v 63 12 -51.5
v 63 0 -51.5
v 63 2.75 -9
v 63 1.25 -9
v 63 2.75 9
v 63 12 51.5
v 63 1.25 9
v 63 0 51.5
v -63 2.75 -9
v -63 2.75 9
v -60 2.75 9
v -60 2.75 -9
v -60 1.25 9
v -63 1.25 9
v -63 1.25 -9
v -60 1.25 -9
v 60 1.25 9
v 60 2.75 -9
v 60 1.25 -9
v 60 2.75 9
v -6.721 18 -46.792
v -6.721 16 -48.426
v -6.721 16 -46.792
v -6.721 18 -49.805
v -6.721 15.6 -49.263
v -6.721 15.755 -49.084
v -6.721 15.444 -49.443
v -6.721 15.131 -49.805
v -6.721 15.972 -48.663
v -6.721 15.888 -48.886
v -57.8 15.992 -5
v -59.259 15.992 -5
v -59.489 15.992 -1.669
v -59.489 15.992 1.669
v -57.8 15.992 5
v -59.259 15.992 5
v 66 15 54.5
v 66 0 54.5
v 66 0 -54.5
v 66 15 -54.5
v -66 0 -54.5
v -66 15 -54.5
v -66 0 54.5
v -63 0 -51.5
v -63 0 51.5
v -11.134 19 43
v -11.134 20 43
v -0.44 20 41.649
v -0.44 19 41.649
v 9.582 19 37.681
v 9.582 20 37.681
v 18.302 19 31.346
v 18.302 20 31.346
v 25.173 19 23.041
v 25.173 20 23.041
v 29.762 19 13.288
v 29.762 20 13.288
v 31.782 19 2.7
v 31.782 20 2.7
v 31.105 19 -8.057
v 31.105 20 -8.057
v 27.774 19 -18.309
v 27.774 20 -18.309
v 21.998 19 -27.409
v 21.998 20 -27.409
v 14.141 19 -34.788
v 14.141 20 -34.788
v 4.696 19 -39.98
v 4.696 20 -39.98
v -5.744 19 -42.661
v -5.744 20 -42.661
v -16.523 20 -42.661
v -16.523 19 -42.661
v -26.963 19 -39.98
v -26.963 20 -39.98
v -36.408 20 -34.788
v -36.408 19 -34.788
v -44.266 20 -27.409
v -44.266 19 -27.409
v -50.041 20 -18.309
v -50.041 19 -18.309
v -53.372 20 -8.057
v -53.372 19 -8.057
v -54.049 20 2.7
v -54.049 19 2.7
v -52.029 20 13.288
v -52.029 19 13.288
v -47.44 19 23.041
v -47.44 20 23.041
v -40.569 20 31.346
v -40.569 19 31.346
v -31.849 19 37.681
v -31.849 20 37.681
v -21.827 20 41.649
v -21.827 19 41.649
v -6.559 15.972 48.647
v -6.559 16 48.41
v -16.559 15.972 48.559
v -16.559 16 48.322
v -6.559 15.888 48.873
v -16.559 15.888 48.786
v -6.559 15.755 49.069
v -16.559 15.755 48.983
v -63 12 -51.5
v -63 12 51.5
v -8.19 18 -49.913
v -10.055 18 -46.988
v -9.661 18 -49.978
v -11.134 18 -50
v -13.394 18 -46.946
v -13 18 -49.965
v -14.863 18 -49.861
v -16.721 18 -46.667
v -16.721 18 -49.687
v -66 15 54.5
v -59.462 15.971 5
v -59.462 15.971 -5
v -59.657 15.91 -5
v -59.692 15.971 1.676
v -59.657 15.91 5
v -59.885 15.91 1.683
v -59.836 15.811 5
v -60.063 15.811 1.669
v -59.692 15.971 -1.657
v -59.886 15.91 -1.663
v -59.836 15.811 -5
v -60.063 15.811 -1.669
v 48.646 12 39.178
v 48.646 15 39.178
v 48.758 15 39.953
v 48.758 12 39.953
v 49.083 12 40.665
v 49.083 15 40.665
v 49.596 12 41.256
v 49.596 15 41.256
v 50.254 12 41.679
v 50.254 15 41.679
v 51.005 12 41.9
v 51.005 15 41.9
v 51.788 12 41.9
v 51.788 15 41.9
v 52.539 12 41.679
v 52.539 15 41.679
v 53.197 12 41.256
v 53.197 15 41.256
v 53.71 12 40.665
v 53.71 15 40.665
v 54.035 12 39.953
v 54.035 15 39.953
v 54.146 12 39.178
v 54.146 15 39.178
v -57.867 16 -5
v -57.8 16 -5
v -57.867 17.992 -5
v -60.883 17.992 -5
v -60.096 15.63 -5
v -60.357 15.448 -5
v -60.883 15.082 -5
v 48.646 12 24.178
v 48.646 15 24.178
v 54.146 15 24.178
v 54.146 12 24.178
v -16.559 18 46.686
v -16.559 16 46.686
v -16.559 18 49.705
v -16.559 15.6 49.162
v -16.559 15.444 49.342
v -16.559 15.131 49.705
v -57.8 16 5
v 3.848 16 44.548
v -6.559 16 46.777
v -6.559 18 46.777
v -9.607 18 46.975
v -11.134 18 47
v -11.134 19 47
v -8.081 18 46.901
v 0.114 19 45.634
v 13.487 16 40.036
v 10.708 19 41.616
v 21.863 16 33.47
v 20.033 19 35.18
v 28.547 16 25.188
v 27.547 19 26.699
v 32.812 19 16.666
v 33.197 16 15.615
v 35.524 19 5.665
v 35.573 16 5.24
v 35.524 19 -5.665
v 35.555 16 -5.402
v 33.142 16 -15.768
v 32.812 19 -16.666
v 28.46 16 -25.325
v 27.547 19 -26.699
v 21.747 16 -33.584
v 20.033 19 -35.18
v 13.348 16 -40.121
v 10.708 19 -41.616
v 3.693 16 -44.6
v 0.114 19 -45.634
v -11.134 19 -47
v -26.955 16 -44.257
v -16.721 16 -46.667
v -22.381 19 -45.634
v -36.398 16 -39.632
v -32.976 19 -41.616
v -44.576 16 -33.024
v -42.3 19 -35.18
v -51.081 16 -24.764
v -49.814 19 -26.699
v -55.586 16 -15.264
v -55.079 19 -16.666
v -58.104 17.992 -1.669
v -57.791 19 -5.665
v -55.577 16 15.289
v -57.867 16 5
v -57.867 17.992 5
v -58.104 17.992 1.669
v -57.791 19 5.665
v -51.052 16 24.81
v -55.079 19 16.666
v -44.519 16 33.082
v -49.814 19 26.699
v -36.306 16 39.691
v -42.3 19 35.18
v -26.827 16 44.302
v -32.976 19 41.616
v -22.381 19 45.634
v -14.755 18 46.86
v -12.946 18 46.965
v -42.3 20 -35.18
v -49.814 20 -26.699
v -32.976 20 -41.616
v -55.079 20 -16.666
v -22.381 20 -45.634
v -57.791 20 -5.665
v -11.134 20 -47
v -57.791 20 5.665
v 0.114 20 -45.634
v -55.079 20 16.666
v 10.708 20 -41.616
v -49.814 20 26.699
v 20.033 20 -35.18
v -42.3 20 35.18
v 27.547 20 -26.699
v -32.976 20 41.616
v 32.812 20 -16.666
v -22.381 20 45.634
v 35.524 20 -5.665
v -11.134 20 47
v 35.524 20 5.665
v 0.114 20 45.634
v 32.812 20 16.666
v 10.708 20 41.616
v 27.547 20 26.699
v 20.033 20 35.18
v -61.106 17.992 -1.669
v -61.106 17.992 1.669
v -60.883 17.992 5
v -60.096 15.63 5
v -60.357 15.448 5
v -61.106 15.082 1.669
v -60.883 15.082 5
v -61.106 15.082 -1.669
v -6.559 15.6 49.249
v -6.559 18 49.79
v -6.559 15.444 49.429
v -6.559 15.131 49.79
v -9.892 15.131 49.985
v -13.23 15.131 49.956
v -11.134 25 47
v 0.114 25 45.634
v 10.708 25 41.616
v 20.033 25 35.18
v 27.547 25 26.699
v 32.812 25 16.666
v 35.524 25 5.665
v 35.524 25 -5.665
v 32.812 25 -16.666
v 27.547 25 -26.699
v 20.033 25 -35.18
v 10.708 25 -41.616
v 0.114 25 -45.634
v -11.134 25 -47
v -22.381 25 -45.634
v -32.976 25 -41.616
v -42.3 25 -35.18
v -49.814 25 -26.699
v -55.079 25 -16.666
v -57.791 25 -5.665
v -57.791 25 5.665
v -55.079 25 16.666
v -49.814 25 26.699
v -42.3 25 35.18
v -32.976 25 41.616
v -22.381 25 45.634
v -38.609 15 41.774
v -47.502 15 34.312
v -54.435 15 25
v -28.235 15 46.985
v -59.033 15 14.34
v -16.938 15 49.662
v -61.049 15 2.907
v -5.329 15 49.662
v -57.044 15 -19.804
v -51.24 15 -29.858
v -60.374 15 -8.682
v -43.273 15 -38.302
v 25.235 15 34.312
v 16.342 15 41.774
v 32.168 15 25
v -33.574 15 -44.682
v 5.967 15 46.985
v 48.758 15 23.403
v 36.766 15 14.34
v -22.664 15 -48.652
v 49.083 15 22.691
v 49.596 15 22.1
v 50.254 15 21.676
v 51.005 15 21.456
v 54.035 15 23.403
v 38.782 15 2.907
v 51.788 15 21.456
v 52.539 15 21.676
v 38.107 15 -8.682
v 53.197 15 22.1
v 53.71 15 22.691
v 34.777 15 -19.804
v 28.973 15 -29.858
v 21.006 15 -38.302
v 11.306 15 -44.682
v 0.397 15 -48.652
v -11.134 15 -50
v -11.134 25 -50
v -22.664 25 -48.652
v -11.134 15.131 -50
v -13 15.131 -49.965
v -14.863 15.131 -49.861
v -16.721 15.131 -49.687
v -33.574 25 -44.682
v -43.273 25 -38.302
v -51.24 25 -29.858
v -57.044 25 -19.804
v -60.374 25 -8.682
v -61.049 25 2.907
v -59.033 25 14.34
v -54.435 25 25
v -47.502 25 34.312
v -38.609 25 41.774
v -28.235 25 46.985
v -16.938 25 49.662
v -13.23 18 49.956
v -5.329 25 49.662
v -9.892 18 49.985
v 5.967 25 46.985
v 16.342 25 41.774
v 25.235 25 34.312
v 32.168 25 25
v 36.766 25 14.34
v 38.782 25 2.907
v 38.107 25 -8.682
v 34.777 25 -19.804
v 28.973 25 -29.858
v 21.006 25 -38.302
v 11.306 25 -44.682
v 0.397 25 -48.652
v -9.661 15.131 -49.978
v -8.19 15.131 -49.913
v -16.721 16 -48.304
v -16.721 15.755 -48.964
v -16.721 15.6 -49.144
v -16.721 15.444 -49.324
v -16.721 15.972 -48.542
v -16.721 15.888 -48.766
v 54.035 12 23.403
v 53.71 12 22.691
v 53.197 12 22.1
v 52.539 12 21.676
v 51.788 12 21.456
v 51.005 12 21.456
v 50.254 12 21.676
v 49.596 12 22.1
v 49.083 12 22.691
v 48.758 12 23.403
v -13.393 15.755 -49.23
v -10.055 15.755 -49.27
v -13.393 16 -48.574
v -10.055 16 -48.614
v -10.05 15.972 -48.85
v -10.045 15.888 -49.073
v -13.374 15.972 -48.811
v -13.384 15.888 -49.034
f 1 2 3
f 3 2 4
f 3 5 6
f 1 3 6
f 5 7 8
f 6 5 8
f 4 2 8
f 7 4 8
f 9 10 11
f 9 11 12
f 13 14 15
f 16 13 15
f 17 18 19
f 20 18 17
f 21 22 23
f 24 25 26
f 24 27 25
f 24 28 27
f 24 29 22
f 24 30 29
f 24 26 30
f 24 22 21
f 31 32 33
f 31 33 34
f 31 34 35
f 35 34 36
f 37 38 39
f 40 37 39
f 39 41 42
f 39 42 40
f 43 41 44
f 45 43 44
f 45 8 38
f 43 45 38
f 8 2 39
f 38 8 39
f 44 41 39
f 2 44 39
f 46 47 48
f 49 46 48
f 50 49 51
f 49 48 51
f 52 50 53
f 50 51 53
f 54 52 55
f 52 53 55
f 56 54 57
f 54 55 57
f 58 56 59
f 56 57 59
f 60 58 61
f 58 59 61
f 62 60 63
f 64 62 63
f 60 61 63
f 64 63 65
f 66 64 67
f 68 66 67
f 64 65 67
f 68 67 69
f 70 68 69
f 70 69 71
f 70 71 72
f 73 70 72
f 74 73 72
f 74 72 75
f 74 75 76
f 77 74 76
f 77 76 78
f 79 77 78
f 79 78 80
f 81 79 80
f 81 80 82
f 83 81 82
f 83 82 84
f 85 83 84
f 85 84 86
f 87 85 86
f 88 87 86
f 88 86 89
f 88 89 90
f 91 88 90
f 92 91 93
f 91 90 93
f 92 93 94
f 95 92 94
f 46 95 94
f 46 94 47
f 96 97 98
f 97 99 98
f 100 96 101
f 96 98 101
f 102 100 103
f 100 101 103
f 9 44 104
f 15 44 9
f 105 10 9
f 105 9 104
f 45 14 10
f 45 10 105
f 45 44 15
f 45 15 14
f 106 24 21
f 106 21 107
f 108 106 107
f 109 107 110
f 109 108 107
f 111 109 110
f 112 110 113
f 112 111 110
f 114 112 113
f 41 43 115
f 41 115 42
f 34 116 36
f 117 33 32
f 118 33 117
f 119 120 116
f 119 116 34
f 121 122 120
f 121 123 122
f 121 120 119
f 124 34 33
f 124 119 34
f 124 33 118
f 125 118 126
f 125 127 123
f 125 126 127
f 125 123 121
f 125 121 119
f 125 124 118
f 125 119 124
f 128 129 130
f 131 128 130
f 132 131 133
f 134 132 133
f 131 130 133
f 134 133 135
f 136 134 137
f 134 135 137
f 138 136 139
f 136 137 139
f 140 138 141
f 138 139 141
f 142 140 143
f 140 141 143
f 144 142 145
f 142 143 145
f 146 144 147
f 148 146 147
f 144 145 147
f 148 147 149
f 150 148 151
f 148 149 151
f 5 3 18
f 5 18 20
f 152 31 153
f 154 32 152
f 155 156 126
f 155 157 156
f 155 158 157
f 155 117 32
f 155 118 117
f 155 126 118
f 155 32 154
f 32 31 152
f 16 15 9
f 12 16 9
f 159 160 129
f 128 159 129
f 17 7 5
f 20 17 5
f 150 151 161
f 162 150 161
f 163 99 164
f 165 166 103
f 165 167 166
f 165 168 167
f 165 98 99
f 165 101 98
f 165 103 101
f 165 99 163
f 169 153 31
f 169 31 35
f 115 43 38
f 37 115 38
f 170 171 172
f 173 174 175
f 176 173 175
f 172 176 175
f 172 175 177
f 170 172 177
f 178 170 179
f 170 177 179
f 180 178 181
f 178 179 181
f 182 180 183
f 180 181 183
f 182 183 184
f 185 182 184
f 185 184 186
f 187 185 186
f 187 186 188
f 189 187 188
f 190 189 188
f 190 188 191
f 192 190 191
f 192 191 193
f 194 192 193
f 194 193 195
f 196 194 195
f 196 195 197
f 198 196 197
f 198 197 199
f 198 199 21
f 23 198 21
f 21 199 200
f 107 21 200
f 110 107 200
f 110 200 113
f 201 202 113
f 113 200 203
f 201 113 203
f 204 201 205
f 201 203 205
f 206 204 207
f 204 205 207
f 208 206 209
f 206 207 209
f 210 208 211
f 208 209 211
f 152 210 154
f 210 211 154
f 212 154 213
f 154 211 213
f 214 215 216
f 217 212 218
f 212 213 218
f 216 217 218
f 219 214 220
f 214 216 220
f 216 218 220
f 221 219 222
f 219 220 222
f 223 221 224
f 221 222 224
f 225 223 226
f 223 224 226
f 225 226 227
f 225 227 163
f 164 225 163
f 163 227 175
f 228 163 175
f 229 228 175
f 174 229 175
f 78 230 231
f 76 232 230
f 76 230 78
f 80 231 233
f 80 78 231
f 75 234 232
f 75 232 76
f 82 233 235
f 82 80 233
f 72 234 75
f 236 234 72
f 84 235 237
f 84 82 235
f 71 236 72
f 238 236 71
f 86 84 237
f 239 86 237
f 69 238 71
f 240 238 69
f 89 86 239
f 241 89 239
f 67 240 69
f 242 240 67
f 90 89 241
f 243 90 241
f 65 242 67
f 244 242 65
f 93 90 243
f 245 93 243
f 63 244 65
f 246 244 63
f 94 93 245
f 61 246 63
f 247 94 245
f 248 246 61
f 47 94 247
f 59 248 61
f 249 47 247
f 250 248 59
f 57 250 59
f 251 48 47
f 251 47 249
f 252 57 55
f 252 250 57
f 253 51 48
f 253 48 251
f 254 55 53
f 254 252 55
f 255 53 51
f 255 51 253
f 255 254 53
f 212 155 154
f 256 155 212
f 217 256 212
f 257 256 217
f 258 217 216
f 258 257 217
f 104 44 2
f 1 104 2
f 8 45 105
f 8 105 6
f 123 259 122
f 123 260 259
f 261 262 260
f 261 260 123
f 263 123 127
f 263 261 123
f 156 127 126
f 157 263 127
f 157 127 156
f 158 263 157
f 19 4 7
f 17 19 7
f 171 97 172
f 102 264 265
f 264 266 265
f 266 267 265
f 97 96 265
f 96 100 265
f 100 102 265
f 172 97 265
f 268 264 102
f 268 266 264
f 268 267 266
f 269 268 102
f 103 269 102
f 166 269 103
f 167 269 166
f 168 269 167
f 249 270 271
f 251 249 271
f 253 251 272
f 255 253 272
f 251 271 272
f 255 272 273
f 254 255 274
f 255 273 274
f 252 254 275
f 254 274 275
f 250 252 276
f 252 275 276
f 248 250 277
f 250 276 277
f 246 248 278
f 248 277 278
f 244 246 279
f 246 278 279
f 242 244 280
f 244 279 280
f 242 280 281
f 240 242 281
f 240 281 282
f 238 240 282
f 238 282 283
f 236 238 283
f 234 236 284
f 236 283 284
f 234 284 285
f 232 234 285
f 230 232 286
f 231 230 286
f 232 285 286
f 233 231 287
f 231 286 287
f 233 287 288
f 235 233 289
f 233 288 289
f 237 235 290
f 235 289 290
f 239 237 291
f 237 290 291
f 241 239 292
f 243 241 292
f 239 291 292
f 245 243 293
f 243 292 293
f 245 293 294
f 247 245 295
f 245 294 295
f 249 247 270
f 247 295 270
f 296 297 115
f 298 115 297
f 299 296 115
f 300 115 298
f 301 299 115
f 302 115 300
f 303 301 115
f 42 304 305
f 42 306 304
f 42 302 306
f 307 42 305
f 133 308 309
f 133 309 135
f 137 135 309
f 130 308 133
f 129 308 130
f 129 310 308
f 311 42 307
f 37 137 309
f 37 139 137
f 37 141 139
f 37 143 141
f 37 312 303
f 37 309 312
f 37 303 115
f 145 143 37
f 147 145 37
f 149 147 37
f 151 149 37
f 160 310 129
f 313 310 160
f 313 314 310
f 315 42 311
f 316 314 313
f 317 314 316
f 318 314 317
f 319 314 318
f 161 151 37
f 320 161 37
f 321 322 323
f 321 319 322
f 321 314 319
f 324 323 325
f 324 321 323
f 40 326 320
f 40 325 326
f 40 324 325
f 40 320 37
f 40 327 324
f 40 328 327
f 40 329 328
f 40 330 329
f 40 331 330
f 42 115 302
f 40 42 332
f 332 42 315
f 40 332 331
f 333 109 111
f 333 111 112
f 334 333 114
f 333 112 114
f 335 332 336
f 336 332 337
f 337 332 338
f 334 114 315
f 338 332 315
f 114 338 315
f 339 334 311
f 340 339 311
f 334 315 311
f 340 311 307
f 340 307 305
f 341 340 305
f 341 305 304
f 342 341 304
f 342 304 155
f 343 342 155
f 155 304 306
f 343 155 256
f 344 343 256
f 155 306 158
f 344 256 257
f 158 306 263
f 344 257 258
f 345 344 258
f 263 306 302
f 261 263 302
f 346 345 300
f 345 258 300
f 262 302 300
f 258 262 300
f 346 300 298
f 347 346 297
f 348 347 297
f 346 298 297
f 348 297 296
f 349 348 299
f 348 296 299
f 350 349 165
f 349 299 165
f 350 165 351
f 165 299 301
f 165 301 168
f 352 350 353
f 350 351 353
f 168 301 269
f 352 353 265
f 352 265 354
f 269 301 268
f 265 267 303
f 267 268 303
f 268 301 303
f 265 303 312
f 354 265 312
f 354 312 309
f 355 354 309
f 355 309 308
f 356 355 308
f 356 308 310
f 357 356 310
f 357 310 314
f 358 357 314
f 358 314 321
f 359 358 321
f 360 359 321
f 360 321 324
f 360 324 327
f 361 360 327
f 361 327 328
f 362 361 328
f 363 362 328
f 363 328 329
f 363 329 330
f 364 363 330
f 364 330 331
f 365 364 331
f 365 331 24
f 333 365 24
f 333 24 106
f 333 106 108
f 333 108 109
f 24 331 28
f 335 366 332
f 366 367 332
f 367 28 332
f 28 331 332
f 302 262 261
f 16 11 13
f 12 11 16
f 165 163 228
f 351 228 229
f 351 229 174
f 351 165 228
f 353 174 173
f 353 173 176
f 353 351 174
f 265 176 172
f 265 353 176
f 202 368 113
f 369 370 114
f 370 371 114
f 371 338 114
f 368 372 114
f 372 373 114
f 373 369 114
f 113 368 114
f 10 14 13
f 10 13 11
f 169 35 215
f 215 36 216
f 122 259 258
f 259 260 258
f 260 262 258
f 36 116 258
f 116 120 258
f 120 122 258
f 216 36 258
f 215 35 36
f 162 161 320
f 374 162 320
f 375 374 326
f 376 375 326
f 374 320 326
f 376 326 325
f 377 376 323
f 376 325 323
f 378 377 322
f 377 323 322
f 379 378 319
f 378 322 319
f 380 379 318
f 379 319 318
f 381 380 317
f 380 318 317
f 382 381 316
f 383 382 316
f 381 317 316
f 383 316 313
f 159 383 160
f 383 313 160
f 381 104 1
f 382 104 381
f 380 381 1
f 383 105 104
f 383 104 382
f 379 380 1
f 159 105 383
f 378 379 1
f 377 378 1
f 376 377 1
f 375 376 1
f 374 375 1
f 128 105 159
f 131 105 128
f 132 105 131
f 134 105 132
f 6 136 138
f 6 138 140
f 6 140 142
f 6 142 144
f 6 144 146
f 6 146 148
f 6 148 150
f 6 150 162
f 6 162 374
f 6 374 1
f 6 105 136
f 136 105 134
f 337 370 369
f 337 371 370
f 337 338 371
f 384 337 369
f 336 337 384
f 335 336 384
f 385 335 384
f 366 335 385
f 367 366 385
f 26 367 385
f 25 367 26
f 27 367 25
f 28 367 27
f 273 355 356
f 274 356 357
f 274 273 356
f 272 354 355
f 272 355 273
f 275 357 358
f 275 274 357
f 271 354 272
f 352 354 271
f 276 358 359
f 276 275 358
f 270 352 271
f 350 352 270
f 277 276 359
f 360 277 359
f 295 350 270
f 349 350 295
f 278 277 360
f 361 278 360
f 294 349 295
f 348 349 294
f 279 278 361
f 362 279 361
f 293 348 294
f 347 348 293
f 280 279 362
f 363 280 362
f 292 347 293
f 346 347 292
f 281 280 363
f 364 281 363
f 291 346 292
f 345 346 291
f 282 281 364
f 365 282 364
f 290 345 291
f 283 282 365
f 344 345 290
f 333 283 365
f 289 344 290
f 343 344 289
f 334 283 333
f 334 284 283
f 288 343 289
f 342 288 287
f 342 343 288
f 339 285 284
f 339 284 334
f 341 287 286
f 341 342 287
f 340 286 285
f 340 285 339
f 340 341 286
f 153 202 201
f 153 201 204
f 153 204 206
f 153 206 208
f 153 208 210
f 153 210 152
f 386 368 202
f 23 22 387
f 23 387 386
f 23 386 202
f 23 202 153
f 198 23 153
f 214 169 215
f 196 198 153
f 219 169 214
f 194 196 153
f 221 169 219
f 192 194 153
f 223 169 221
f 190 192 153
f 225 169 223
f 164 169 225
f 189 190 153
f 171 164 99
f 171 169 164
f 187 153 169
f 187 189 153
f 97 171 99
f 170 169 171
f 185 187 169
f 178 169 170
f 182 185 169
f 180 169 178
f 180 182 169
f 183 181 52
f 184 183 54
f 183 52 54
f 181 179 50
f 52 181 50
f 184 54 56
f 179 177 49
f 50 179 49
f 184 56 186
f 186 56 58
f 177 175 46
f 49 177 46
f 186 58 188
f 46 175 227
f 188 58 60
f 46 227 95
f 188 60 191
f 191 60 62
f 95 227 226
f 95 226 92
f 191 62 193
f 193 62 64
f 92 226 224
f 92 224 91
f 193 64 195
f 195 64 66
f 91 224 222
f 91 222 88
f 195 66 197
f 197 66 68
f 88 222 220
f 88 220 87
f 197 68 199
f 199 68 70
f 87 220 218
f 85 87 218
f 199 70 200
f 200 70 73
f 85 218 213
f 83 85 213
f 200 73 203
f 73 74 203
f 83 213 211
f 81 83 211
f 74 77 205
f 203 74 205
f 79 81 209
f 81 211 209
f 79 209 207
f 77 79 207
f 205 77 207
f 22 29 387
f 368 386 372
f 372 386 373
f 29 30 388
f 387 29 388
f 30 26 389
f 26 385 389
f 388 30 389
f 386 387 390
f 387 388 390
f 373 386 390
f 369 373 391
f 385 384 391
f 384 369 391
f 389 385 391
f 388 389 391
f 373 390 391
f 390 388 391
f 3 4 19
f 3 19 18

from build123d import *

# Parameters (mm, degrees)
SKETCH1_W            = 132
SKETCH1_H            = 109
BOSS_EXTRUDE1_DEPTH  = 15
SKETCH2_W            = 126
SKETCH2_H            = 103
CUT_EXTRUDE1_DEPTH   = 12
SKETCH3_W            = 18
SKETCH3_H            = 1.5
BOSS_EXTRUDE6_DEPTH  = 3
SKETCH6_W            = 18
SKETCH6_H            = 1.5
BOSS_EXTRUDE7_DEPTH  = 3
CUT_EXTRUDE2_DEPTH   = 10
SKETCH13_R           = 50
BOSS_EXTRUDE10_DEPTH = 4
SKETCH18_R           = 47
CUT_EXTRUDE6_DEPTH   = 3
SKETCH19_R           = 50
BOSS_EXTRUDE11_DEPTH = 6
SKETCH20_R           = 47
CUT_EXTRUDE7_DEPTH   = 5
SKETCH21_R           = 43
CUT_EXTRUDE8_DEPTH   = 3
SKETCH22_W           = 10
SKETCH22_H           = 2
CUT_EXTRUDE10_DEPTH  = 8.2
CHAMFER2_SIZE        = 1.3
CHAMFER2_SIZE2       = 0.9102698
FILLET2_R            = 1
SKETCH23_W           = 10
SKETCH23_H           = 2
CUT_EXTRUDE11_DEPTH  = 8.2
CHAMFER3_SIZE        = 1
CHAMFER3_SIZE2       = 0.869286738
FILLET3_R            = 1
SKETCH24_W           = 10
SKETCH24_H           = 2
CUT_EXTRUDE12_DEPTH  = 8.2
CHAMFER4_SIZE        = 1
CHAMFER4_SIZE2       = 0.869286738
FILLET4_R            = 1


with BuildPart() as part:
    # Sketch1 → Boss-Extrude1 (new body)
    with BuildSketch(Plane(origin=(0, 0, 0), x_dir=(1, 0, 0), z_dir=(0, 1, 0))):
        Rectangle(SKETCH1_W, SKETCH1_H)
    extrude(amount=BOSS_EXTRUDE1_DEPTH)

    # Sketch2 → Cut-Extrude1 (cut)
    with BuildSketch(Plane.XZ):
        Rectangle(SKETCH2_W, SKETCH2_H)
    extrude(amount=-CUT_EXTRUDE1_DEPTH, mode=Mode.SUBTRACT)

    # Sketch3 → Boss-Extrude6 (add)
    with BuildSketch(Plane(origin=(-63, 0, 0), x_dir=(0, 0, -1), z_dir=(1, 0, 0))):
        with Locations((0, 2)):
            Rectangle(SKETCH3_W, SKETCH3_H)
    extrude(amount=BOSS_EXTRUDE6_DEPTH)

    # Sketch6 → Boss-Extrude7 (add)
    with BuildSketch(Plane.ZY.offset(-63)):
        with Locations((0, 2)):
            Rectangle(SKETCH6_W, SKETCH6_H)
    extrude(amount=BOSS_EXTRUDE7_DEPTH)

    # Sketch14 → Cut-Extrude2 (cut)
    with BuildSketch(Plane(origin=(0, 15, 0), x_dir=(1, 0, 0), z_dir=(0, 1, 0))):
        with BuildLine():
            Line((48.646447832, -24.177866046), (48.646447832, -39.177866046))
            ThreePointArc((48.646447832, -39.177866046), (51.396447832, -41.927866046), (54.146447832, -39.177866046))
            Line((54.146447832, -39.177866046), (54.146447832, -24.177866046))
            ThreePointArc((54.146447832, -24.177866046), (51.396447832, -21.427866046), (48.646447832, -24.177866046))
        make_face()
    extrude(amount=-CUT_EXTRUDE2_DEPTH, mode=Mode.SUBTRACT)

    # Sketch13 → Boss-Extrude10 (add)
    with BuildSketch(Plane(origin=(0, 15, 0), x_dir=(1, 0, 0), z_dir=(0, 1, 0))):
        with Locations(Location((-11.133590864, 0, 0), (0, 0, 90))):
            Circle(SKETCH13_R)
    extrude(amount=BOSS_EXTRUDE10_DEPTH)

    # Sketch18 → Cut-Extrude6 (cut)
    with BuildSketch(Plane(origin=(0, 19, 0), x_dir=(1, 0, 0), z_dir=(0, 1, 0))):
        with Locations(Location((-11.133590864, 0, 0), (0, 0, 270))):
            Circle(SKETCH18_R)
    extrude(amount=-CUT_EXTRUDE6_DEPTH, mode=Mode.SUBTRACT)

    # Sketch19 → Boss-Extrude11 (add)
    with BuildSketch(Plane(origin=(0, 19, 0), x_dir=(1, 0, 0), z_dir=(0, 1, 0))):
        with Locations(Location((-11.133590864, 0, 0), (0, 0, 90))):
            Circle(SKETCH19_R)
    extrude(amount=BOSS_EXTRUDE11_DEPTH)

    # Sketch20 → Cut-Extrude7 (cut)
    with BuildSketch(Plane(origin=(0, 25, 0), x_dir=(1, 0, 0), z_dir=(0, 1, 0))):
        with Locations(Location((-11.133590864, 0, 0), (0, 0, 270))):
            Circle(SKETCH20_R)
    extrude(amount=-CUT_EXTRUDE7_DEPTH, mode=Mode.SUBTRACT)

    # Sketch21 → Cut-Extrude8 (cut)
    with BuildSketch(Plane(origin=(0, 20, 0), x_dir=(1, 0, 0), z_dir=(0, 1, 0))):
        with Locations(Location((-11.133590864, 0, 0), (0, 0, 270))):
            Circle(SKETCH21_R)
    extrude(amount=-CUT_EXTRUDE8_DEPTH, mode=Mode.SUBTRACT)

    # Sketch22 → Cut-Extrude10 (cut)
    with BuildSketch(Plane.ZY.offset(66)):
        with Locations((0, 16.991930037)):
            Rectangle(SKETCH22_W, SKETCH22_H)
    extrude(amount=-CUT_EXTRUDE10_DEPTH, mode=Mode.SUBTRACT)

    # Chamfer2
    chamfer2_edges = [part.edges().sort_by_distance(p)[0] for p in [
        (-61.133590864, 15.991930037, 0),
    ]]
    chamfer2_side = [part.faces().sort_by_distance(p)[0] for p in [
        (-59.42592439, 15.991930037, 0),
    ]]
    chamfer(chamfer2_edges, length=CHAMFER2_SIZE, length2=CHAMFER2_SIZE2, reference=chamfer2_side[0])

    # Fillet2
    fillet2_edges = [part.edges().sort_by_distance(p)[0] for p in [
        (-59.833590864, 15.991930037, 0),
    ]]
    fillet(fillet2_edges, radius=FILLET2_R)

    # Sketch23 → Cut-Extrude11 (cut)
    with BuildSketch(Plane(origin=(0, 0, -54.5), x_dir=(-1, 0, 0), z_dir=(0, 0, -1))):
        with Locations((11.721254149, 17)):
            Rectangle(SKETCH23_W, SKETCH23_H)
    extrude(amount=-CUT_EXTRUDE11_DEPTH, mode=Mode.SUBTRACT)

    # Chamfer3
    chamfer3_edges = [part.edges().sort_by_distance(p)[0] for p in [
        (-13.931807962, 16, -49.921638405),
    ]]
    chamfer3_side = [part.faces().sort_by_distance(p)[0] for p in [
        (-11.119691984, 16, -0.208830113),
    ]]
    chamfer(chamfer3_edges, length=CHAMFER3_SIZE, length2=CHAMFER3_SIZE2, reference=chamfer3_side[0])

    # Fillet3
    fillet3_edges = [part.edges().sort_by_distance(p)[0] for p in [
        (-11.724338174, 16, -48.996438826),
    ]]
    fillet(fillet3_edges, radius=FILLET3_R)

    # Sketch24 → Cut-Extrude12 (cut)
    with BuildSketch(Plane.XY.offset(54.5)):
        with Locations((-11.559090934, 17)):
            Rectangle(SKETCH24_W, SKETCH24_H)
    extrude(amount=-CUT_EXTRUDE12_DEPTH, mode=Mode.SUBTRACT)

    # Chamfer4
    chamfer4_edges = [part.edges().sort_by_distance(p)[0] for p in [
        (-11.561234683, 16, 49.998171174),
    ]]
    chamfer4_side = [part.faces().sort_by_distance(p)[0] for p in [
        (-11.120399941, 16, 0.097012581),
    ]]
    chamfer(chamfer4_edges, length=CHAMFER4_SIZE, length2=CHAMFER4_SIZE2, reference=chamfer4_side[0])

    # Fillet4
    fillet4_edges = [part.edges().sort_by_distance(p)[0] for p in [
        (-11.56132378, 16, 48.998133072),
    ]]
    fillet(fillet4_edges, radius=FILLET4_R)


solid = part.part
